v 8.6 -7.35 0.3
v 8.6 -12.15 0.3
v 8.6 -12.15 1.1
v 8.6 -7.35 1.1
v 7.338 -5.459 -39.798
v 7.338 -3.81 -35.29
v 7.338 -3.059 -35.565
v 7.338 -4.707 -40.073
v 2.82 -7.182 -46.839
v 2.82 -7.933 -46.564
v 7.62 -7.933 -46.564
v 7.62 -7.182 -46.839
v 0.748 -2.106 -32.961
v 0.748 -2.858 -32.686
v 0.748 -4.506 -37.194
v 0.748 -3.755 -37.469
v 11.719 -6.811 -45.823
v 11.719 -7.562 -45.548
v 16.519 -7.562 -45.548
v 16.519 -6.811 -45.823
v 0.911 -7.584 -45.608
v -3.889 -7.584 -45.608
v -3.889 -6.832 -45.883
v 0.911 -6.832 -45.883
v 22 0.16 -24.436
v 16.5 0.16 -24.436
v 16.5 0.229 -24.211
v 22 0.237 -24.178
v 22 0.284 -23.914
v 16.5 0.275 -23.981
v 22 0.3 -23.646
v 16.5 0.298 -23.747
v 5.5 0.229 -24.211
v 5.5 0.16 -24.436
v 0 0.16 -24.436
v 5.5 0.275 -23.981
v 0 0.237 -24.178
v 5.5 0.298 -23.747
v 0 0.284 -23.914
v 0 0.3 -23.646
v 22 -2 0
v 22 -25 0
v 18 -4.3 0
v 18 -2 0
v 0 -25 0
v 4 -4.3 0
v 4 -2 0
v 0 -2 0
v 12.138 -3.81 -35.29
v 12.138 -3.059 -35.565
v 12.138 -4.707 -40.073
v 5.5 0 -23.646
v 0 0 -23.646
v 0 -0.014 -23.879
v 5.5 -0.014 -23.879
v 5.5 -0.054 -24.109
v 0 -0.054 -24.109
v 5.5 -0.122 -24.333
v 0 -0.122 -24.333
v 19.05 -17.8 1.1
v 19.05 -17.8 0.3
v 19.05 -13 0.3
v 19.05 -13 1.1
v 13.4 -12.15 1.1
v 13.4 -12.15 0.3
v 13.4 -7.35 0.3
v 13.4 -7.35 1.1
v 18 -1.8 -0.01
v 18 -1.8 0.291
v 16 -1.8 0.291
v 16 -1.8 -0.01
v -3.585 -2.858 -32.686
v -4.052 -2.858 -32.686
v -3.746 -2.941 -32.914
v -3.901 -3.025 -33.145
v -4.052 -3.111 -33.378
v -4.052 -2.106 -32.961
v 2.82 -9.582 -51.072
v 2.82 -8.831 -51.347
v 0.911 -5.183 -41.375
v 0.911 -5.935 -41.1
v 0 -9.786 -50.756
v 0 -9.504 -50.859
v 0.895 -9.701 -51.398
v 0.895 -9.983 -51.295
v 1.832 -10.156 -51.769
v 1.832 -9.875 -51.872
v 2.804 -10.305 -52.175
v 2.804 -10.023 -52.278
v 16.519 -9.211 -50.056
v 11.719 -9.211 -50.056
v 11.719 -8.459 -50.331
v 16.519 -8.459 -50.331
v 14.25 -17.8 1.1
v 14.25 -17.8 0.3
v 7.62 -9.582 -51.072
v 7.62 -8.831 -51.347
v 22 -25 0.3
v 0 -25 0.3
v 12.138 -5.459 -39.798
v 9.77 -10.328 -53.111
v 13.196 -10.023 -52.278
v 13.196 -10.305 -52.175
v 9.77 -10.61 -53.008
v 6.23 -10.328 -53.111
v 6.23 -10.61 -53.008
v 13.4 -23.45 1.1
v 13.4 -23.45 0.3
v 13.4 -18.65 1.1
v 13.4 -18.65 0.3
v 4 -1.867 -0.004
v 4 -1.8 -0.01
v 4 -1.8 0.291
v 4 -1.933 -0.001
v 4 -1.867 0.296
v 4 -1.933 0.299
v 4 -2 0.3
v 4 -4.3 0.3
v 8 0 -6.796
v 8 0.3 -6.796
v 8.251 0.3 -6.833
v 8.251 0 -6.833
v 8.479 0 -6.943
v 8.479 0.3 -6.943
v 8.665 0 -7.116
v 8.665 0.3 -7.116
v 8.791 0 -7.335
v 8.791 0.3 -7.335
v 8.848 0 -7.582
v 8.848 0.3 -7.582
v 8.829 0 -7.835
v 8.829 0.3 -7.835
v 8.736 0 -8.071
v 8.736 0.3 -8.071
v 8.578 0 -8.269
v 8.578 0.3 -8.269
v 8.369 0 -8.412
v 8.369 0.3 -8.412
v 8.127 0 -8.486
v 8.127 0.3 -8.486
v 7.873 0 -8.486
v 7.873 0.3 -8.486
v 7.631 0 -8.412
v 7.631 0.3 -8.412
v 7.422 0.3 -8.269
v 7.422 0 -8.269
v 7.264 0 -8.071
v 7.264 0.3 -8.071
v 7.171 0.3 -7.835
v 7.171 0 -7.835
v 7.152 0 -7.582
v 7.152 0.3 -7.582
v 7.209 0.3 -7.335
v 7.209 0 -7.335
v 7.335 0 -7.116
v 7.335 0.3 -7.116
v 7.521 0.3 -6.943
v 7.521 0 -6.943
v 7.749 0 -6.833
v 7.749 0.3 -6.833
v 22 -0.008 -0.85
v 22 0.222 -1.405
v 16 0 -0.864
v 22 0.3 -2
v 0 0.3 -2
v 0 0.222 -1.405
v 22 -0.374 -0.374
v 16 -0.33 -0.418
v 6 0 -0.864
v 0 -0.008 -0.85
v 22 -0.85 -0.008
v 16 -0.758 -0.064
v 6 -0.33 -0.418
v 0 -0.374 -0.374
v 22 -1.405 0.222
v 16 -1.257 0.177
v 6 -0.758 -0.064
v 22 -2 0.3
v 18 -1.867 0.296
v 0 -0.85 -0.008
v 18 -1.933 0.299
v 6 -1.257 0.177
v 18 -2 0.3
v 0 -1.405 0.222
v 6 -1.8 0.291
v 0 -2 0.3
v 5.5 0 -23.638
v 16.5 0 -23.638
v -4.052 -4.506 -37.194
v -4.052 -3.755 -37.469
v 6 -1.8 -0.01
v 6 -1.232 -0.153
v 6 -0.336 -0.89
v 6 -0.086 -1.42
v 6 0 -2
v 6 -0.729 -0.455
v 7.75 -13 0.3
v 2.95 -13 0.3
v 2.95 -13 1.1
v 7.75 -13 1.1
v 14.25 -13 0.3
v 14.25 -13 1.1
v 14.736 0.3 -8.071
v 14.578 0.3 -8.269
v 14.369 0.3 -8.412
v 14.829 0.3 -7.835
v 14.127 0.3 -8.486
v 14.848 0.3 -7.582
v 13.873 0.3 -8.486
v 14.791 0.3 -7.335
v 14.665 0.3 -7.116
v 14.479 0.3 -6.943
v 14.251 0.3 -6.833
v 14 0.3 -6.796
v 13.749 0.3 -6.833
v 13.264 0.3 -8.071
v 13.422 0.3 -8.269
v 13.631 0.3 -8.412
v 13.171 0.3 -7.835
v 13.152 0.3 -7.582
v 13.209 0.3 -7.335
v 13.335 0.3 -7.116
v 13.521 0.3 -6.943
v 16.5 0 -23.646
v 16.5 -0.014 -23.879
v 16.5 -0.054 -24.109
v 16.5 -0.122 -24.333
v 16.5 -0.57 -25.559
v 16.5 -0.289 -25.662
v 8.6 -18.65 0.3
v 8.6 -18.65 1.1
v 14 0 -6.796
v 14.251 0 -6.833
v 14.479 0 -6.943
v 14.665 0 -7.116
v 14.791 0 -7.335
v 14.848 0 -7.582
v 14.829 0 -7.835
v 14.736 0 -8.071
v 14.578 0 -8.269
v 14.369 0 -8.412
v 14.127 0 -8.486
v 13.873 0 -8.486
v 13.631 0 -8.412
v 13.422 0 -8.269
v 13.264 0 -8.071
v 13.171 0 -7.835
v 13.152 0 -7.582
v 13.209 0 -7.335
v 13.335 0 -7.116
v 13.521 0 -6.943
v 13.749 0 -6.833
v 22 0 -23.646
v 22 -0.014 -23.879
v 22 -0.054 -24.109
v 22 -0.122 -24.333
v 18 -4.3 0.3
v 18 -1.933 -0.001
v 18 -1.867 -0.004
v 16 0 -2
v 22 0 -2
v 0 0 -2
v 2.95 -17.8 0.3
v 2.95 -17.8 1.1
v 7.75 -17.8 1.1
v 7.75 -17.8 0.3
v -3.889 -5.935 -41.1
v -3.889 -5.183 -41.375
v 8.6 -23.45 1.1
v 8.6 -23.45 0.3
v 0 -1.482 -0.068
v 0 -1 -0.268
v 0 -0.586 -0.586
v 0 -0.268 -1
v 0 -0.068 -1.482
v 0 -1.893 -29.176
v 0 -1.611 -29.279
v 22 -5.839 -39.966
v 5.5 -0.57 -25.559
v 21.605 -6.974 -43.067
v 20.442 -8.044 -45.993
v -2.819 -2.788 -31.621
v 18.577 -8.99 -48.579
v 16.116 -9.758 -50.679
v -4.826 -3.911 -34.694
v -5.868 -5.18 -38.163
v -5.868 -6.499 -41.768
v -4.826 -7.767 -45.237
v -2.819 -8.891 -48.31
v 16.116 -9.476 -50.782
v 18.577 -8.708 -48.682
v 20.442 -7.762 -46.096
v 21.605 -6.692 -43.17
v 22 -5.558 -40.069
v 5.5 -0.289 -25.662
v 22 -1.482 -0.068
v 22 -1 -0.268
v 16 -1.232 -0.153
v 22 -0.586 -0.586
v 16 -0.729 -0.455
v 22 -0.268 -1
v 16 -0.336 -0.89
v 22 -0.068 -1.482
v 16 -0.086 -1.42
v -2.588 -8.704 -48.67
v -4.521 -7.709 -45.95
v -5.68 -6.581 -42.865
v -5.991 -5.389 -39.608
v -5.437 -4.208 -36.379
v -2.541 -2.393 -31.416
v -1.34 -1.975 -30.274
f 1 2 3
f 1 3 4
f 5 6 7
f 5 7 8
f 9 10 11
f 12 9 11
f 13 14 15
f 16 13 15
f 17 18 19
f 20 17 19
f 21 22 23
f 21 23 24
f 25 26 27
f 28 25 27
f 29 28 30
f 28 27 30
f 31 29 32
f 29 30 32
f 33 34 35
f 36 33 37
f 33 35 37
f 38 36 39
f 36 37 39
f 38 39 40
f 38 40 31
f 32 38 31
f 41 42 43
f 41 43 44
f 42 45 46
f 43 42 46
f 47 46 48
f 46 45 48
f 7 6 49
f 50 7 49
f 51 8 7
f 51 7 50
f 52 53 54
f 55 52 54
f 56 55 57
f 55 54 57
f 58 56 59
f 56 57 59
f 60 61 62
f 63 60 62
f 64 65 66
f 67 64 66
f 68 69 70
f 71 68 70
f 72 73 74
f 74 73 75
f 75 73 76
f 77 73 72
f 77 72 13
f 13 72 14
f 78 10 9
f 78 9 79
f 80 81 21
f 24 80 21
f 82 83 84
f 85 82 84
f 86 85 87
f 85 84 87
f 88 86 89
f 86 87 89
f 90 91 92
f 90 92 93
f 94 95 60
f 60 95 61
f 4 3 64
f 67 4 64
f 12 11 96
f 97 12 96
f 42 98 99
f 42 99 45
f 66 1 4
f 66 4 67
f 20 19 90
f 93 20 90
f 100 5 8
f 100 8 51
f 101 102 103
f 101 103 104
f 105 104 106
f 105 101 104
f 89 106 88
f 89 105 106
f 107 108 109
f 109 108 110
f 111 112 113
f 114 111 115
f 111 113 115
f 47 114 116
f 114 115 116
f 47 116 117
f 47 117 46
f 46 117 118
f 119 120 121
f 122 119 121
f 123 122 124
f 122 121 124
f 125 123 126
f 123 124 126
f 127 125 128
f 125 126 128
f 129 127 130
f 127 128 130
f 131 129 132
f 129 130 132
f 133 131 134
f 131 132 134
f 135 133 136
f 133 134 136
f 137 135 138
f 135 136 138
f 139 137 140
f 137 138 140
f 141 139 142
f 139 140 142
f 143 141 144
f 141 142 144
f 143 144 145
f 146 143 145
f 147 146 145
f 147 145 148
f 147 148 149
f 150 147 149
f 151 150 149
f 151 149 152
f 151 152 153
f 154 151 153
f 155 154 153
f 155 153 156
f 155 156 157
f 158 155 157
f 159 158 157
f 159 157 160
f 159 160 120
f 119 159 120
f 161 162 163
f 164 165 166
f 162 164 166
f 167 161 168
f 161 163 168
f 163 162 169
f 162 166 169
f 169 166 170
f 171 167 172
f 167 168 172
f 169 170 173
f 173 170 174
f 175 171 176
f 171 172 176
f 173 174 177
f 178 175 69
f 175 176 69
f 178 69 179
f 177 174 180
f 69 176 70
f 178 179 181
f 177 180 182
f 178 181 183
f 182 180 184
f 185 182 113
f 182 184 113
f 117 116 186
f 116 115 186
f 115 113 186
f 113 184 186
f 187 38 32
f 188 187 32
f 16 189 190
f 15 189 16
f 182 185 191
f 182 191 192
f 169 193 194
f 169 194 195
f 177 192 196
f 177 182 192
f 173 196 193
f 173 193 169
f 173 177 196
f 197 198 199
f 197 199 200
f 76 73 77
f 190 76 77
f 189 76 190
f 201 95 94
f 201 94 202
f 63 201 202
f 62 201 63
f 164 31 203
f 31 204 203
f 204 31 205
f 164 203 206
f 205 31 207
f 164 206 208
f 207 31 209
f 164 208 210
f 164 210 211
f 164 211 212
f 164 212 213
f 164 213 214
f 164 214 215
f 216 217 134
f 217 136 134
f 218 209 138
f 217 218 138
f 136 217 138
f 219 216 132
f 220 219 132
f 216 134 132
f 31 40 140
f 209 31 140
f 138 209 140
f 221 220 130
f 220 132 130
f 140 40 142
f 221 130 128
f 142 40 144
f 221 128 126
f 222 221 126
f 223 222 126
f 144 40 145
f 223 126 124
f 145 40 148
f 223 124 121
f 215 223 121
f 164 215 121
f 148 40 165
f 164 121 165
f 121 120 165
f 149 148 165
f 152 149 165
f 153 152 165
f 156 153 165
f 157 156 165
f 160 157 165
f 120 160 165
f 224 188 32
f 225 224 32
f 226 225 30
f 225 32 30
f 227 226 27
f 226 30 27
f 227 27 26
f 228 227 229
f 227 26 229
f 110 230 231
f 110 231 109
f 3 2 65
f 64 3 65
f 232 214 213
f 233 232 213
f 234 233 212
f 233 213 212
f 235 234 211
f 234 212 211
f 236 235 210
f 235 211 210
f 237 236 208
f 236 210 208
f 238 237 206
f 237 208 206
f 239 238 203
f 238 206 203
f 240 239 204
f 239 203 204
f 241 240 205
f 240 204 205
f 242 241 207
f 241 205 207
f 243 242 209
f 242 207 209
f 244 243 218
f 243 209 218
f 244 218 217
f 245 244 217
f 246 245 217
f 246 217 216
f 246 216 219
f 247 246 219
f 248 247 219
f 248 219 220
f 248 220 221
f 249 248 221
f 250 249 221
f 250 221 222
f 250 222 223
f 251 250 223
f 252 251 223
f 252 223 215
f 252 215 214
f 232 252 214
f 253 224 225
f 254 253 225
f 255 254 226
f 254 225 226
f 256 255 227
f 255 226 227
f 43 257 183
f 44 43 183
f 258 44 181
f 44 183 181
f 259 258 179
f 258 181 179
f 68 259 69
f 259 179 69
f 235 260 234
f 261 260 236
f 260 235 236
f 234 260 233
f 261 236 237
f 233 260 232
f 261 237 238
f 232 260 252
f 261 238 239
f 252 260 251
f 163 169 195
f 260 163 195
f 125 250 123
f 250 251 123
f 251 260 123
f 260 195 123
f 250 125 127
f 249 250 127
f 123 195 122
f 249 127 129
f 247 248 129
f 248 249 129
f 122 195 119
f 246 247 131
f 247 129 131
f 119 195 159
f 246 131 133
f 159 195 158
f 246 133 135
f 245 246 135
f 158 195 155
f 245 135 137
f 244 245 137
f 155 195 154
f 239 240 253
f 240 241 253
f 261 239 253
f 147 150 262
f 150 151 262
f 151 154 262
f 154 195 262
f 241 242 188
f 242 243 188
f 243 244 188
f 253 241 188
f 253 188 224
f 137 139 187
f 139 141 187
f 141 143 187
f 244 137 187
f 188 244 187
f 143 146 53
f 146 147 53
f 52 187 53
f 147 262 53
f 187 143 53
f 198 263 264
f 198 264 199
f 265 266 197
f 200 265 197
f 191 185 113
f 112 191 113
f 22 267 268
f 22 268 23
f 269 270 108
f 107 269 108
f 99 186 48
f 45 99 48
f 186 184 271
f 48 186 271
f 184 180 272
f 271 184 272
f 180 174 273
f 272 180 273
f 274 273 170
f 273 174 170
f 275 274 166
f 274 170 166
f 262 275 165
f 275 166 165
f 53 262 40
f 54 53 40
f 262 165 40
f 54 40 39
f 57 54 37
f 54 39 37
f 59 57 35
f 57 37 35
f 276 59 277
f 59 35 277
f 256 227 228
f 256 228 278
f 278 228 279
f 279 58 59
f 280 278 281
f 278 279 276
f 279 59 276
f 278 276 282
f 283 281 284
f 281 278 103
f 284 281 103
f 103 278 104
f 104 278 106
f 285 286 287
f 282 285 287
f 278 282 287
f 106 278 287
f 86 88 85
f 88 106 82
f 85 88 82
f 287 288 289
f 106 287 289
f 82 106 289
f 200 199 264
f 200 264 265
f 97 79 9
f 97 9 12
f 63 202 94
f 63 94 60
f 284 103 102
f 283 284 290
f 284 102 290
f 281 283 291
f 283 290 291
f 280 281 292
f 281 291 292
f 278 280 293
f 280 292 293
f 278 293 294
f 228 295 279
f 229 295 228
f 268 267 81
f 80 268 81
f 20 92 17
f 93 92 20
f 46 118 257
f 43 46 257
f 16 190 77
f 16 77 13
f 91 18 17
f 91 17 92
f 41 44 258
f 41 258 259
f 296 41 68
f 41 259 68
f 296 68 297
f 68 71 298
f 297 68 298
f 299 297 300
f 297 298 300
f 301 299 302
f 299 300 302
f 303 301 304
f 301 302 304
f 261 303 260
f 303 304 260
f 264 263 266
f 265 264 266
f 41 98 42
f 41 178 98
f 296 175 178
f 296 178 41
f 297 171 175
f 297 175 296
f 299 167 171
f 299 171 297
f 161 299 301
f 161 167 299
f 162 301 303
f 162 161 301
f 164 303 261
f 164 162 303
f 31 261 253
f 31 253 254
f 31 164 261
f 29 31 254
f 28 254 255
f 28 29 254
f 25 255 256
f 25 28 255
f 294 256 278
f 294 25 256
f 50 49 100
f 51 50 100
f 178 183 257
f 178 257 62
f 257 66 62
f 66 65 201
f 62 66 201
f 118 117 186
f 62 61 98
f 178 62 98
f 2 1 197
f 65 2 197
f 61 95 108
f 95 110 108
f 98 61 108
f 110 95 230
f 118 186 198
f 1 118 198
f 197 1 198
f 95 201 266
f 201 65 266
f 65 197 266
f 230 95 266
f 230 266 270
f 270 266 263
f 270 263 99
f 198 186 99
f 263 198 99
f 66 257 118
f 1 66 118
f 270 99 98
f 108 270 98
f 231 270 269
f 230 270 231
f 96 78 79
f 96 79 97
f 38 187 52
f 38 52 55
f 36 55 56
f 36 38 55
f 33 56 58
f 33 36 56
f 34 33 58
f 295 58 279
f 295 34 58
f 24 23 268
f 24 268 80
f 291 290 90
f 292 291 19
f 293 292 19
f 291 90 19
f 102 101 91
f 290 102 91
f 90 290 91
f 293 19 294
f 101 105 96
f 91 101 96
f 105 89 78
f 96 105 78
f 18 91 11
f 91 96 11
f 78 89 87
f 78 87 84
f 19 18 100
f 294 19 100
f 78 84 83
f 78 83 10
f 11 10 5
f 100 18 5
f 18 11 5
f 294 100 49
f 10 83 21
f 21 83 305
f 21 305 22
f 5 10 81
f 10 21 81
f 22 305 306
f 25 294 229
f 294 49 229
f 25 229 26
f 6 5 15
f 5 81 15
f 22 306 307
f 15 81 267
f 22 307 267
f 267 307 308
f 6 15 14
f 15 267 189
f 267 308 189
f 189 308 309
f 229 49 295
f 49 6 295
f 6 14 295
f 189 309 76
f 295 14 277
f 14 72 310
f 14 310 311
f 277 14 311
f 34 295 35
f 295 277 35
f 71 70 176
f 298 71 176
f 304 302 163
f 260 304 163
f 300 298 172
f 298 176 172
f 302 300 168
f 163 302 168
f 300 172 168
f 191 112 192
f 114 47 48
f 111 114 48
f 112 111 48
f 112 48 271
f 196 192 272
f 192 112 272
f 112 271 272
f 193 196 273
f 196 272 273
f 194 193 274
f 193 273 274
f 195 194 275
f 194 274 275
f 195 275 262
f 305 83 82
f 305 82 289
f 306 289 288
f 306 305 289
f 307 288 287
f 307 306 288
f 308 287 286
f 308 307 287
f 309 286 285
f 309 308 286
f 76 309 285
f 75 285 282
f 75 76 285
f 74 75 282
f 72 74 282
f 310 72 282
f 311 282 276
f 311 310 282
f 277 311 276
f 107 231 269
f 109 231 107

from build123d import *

# Parameters (mm, degrees)
EXTRUDE_1_DEPTH     = 22
CUT_EXTRUDE_1_DEPTH = 4
CUT_EXTRUDE_2_DEPTH = 64.319089808
SKETCH_3_3_R        = 14
EXTRUDE_2_DEPTH     = 0.3
SKETCH_4_W          = 4.8
SKETCH_4_H          = 4.8
EXTRUDE_3_DEPTH     = 0.8
SKETCH_5_R          = 0.85
CUT_EXTRUDE_3_DEPTH = 63.897702188
SKETCH_6_W          = 11
SKETCH_6_H          = 2
CUT_EXTRUDE_4_DEPTH = 1
SKETCH_7_W          = 4.8
SKETCH_7_H          = 4.8
EXTRUDE_4_DEPTH     = 0.8


with BuildPart() as part:
    # 草图1 → 凸台-拉伸1 (new body)
    with BuildSketch(Plane(origin=(0, 0, 0), x_dir=(0, 0, -1), z_dir=(1, 0, 0))):
        with BuildLine():
            Line((0, -25), (0, -2))
            ThreePointArc((0, -2), (0.585786438, -0.585786438), (2, 0))
            Line((2, 0), (23.64572618, 0))
            ThreePointArc((23.64572618, 0), (23.99456936, -0.030657867), (24.332717753, -0.121691565))
            Line((24.332717753, -0.121691565), (52.174626532, -10.304873595))
            Line((52.174626532, -10.304873595), (52.277675268, -10.023127329))
            Line((52.277675268, -10.023127329), (24.435766489, 0.160054701))
            ThreePointArc((24.435766489, 0.160054701), (24.046895837, 0.264743453), (23.64572618, 0.3))
            Line((23.64572618, 0.3), (2, 0.3))
            ThreePointArc((2, 0.3), (0.373654403, -0.373654403), (-0.3, -2))
            Line((-0.3, -2), (-0.3, -25))
            Line((-0.3, -25), (0, -25))
        make_face()
    extrude(amount=EXTRUDE_1_DEPTH)

    # 草图2 → 切除-拉伸1 (cut)
    with BuildSketch(Plane.XY.offset(0.3)):
        Polygon((4, -4.3), (18, -4.3), (18, -1.8), (16, -1.8), (16, 0), (6, 0), (6, -1.8), (4, -1.8), align=None)
    extrude(amount=-CUT_EXTRUDE_1_DEPTH, mode=Mode.SUBTRACT)

    # 草图3 → 切除-拉伸2 (cut, through all)
    with BuildSketch(Plane(origin=(0, 8.024038665, -2.934793264), x_dir=(1, 0, 0), z_dir=(0, 0.9391542177229502, -0.3434957864853564))):
        with BuildLine():
            ThreePointArc((13.196152423, 52.539701225), (19.591939741, 47.38998358), (22, 39.539701225))
            Line((22, 39.539701225), (22, 52.539701225))
            Line((22, 52.539701225), (13.196152423, 52.539701225))
        make_face()
        with BuildLine():
            ThreePointArc((0, 51.028826518), (1.358818231, 51.864258204), (2.803847577, 52.539701225))
            Line((2.803847577, 52.539701225), (0, 52.539701225))
            Line((0, 52.539701225), (0, 51.028826518))
        make_face()
    extrude(amount=-CUT_EXTRUDE_2_DEPTH, mode=Mode.SUBTRACT)

    # 草图3<3> → 凸台-拉伸2 (add)
    with BuildSketch(Plane(origin=(0, 8.024038665, -2.934793264), x_dir=(1, 0, 0), z_dir=(0, 0.9391542177229502, -0.3434957864853564))):
        with Locations((8, 39.539701225)):
            Circle(SKETCH_3_3_R)
    extrude(amount=-EXTRUDE_2_DEPTH)

    # 草图4 → 凸台-拉伸3 (add)
    with BuildSketch(Plane.XY.offset(0.3)):
        with Locations((11, -9.75)):
            Rectangle(SKETCH_4_W, SKETCH_4_H)
        with Locations((11, -21.05)):
            Rectangle(SKETCH_4_W, SKETCH_4_H)
        with Locations((5.35, -15.4)):
            Rectangle(SKETCH_4_W, SKETCH_4_H)
        with Locations((16.65, -15.4)):
            Rectangle(SKETCH_4_W, SKETCH_4_H)
    extrude(amount=EXTRUDE_3_DEPTH)

    # 草图5 → 切除-拉伸3 (cut, through all)
    with BuildSketch(Plane(origin=(0, 0.3, 0), x_dir=(1, 0, 0), z_dir=(0, 1, 0))):
        with Locations((8, 7.64572618)):
            Circle(SKETCH_5_R)
        with Locations((14, 7.64572618)):
            Circle(SKETCH_5_R)
    extrude(amount=-CUT_EXTRUDE_3_DEPTH, mode=Mode.SUBTRACT)

    # 草图6 → 切除-拉伸4 (cut)
    with BuildSketch(Plane(origin=(0, 8.024038665, -2.934793264), x_dir=(1, 0, 0), z_dir=(0, 0.9391542177229502, -0.3434957864853564))):
        with Locations((11, 23.2)):
            Rectangle(SKETCH_6_W, SKETCH_6_H)
    extrude(amount=-CUT_EXTRUDE_4_DEPTH, mode=Mode.SUBTRACT)

    # 草图7 → 凸台-拉伸4 (add)
    with BuildSketch(Plane(origin=(0, 8.024038665, -2.934793264), x_dir=(1, 0, 0), z_dir=(0, 0.9391542177229502, -0.3434957864853564))):
        with Locations((9.738477049, 36.851443585)):
            Rectangle(SKETCH_7_W, SKETCH_7_H)
        with Locations((14.118767038, 47.774445204)):
            Rectangle(SKETCH_7_W, SKETCH_7_H)
        with Locations((5.219570287, 48.855656024)):
            Rectangle(SKETCH_7_W, SKETCH_7_H)
        with Locations((-1.489481468, 43.037611303)):
            Rectangle(SKETCH_7_W, SKETCH_7_H)
        with Locations((-1.651961899, 34.079108149)):
            Rectangle(SKETCH_7_W, SKETCH_7_H)
    extrude(amount=EXTRUDE_4_DEPTH)


solid = part.part
